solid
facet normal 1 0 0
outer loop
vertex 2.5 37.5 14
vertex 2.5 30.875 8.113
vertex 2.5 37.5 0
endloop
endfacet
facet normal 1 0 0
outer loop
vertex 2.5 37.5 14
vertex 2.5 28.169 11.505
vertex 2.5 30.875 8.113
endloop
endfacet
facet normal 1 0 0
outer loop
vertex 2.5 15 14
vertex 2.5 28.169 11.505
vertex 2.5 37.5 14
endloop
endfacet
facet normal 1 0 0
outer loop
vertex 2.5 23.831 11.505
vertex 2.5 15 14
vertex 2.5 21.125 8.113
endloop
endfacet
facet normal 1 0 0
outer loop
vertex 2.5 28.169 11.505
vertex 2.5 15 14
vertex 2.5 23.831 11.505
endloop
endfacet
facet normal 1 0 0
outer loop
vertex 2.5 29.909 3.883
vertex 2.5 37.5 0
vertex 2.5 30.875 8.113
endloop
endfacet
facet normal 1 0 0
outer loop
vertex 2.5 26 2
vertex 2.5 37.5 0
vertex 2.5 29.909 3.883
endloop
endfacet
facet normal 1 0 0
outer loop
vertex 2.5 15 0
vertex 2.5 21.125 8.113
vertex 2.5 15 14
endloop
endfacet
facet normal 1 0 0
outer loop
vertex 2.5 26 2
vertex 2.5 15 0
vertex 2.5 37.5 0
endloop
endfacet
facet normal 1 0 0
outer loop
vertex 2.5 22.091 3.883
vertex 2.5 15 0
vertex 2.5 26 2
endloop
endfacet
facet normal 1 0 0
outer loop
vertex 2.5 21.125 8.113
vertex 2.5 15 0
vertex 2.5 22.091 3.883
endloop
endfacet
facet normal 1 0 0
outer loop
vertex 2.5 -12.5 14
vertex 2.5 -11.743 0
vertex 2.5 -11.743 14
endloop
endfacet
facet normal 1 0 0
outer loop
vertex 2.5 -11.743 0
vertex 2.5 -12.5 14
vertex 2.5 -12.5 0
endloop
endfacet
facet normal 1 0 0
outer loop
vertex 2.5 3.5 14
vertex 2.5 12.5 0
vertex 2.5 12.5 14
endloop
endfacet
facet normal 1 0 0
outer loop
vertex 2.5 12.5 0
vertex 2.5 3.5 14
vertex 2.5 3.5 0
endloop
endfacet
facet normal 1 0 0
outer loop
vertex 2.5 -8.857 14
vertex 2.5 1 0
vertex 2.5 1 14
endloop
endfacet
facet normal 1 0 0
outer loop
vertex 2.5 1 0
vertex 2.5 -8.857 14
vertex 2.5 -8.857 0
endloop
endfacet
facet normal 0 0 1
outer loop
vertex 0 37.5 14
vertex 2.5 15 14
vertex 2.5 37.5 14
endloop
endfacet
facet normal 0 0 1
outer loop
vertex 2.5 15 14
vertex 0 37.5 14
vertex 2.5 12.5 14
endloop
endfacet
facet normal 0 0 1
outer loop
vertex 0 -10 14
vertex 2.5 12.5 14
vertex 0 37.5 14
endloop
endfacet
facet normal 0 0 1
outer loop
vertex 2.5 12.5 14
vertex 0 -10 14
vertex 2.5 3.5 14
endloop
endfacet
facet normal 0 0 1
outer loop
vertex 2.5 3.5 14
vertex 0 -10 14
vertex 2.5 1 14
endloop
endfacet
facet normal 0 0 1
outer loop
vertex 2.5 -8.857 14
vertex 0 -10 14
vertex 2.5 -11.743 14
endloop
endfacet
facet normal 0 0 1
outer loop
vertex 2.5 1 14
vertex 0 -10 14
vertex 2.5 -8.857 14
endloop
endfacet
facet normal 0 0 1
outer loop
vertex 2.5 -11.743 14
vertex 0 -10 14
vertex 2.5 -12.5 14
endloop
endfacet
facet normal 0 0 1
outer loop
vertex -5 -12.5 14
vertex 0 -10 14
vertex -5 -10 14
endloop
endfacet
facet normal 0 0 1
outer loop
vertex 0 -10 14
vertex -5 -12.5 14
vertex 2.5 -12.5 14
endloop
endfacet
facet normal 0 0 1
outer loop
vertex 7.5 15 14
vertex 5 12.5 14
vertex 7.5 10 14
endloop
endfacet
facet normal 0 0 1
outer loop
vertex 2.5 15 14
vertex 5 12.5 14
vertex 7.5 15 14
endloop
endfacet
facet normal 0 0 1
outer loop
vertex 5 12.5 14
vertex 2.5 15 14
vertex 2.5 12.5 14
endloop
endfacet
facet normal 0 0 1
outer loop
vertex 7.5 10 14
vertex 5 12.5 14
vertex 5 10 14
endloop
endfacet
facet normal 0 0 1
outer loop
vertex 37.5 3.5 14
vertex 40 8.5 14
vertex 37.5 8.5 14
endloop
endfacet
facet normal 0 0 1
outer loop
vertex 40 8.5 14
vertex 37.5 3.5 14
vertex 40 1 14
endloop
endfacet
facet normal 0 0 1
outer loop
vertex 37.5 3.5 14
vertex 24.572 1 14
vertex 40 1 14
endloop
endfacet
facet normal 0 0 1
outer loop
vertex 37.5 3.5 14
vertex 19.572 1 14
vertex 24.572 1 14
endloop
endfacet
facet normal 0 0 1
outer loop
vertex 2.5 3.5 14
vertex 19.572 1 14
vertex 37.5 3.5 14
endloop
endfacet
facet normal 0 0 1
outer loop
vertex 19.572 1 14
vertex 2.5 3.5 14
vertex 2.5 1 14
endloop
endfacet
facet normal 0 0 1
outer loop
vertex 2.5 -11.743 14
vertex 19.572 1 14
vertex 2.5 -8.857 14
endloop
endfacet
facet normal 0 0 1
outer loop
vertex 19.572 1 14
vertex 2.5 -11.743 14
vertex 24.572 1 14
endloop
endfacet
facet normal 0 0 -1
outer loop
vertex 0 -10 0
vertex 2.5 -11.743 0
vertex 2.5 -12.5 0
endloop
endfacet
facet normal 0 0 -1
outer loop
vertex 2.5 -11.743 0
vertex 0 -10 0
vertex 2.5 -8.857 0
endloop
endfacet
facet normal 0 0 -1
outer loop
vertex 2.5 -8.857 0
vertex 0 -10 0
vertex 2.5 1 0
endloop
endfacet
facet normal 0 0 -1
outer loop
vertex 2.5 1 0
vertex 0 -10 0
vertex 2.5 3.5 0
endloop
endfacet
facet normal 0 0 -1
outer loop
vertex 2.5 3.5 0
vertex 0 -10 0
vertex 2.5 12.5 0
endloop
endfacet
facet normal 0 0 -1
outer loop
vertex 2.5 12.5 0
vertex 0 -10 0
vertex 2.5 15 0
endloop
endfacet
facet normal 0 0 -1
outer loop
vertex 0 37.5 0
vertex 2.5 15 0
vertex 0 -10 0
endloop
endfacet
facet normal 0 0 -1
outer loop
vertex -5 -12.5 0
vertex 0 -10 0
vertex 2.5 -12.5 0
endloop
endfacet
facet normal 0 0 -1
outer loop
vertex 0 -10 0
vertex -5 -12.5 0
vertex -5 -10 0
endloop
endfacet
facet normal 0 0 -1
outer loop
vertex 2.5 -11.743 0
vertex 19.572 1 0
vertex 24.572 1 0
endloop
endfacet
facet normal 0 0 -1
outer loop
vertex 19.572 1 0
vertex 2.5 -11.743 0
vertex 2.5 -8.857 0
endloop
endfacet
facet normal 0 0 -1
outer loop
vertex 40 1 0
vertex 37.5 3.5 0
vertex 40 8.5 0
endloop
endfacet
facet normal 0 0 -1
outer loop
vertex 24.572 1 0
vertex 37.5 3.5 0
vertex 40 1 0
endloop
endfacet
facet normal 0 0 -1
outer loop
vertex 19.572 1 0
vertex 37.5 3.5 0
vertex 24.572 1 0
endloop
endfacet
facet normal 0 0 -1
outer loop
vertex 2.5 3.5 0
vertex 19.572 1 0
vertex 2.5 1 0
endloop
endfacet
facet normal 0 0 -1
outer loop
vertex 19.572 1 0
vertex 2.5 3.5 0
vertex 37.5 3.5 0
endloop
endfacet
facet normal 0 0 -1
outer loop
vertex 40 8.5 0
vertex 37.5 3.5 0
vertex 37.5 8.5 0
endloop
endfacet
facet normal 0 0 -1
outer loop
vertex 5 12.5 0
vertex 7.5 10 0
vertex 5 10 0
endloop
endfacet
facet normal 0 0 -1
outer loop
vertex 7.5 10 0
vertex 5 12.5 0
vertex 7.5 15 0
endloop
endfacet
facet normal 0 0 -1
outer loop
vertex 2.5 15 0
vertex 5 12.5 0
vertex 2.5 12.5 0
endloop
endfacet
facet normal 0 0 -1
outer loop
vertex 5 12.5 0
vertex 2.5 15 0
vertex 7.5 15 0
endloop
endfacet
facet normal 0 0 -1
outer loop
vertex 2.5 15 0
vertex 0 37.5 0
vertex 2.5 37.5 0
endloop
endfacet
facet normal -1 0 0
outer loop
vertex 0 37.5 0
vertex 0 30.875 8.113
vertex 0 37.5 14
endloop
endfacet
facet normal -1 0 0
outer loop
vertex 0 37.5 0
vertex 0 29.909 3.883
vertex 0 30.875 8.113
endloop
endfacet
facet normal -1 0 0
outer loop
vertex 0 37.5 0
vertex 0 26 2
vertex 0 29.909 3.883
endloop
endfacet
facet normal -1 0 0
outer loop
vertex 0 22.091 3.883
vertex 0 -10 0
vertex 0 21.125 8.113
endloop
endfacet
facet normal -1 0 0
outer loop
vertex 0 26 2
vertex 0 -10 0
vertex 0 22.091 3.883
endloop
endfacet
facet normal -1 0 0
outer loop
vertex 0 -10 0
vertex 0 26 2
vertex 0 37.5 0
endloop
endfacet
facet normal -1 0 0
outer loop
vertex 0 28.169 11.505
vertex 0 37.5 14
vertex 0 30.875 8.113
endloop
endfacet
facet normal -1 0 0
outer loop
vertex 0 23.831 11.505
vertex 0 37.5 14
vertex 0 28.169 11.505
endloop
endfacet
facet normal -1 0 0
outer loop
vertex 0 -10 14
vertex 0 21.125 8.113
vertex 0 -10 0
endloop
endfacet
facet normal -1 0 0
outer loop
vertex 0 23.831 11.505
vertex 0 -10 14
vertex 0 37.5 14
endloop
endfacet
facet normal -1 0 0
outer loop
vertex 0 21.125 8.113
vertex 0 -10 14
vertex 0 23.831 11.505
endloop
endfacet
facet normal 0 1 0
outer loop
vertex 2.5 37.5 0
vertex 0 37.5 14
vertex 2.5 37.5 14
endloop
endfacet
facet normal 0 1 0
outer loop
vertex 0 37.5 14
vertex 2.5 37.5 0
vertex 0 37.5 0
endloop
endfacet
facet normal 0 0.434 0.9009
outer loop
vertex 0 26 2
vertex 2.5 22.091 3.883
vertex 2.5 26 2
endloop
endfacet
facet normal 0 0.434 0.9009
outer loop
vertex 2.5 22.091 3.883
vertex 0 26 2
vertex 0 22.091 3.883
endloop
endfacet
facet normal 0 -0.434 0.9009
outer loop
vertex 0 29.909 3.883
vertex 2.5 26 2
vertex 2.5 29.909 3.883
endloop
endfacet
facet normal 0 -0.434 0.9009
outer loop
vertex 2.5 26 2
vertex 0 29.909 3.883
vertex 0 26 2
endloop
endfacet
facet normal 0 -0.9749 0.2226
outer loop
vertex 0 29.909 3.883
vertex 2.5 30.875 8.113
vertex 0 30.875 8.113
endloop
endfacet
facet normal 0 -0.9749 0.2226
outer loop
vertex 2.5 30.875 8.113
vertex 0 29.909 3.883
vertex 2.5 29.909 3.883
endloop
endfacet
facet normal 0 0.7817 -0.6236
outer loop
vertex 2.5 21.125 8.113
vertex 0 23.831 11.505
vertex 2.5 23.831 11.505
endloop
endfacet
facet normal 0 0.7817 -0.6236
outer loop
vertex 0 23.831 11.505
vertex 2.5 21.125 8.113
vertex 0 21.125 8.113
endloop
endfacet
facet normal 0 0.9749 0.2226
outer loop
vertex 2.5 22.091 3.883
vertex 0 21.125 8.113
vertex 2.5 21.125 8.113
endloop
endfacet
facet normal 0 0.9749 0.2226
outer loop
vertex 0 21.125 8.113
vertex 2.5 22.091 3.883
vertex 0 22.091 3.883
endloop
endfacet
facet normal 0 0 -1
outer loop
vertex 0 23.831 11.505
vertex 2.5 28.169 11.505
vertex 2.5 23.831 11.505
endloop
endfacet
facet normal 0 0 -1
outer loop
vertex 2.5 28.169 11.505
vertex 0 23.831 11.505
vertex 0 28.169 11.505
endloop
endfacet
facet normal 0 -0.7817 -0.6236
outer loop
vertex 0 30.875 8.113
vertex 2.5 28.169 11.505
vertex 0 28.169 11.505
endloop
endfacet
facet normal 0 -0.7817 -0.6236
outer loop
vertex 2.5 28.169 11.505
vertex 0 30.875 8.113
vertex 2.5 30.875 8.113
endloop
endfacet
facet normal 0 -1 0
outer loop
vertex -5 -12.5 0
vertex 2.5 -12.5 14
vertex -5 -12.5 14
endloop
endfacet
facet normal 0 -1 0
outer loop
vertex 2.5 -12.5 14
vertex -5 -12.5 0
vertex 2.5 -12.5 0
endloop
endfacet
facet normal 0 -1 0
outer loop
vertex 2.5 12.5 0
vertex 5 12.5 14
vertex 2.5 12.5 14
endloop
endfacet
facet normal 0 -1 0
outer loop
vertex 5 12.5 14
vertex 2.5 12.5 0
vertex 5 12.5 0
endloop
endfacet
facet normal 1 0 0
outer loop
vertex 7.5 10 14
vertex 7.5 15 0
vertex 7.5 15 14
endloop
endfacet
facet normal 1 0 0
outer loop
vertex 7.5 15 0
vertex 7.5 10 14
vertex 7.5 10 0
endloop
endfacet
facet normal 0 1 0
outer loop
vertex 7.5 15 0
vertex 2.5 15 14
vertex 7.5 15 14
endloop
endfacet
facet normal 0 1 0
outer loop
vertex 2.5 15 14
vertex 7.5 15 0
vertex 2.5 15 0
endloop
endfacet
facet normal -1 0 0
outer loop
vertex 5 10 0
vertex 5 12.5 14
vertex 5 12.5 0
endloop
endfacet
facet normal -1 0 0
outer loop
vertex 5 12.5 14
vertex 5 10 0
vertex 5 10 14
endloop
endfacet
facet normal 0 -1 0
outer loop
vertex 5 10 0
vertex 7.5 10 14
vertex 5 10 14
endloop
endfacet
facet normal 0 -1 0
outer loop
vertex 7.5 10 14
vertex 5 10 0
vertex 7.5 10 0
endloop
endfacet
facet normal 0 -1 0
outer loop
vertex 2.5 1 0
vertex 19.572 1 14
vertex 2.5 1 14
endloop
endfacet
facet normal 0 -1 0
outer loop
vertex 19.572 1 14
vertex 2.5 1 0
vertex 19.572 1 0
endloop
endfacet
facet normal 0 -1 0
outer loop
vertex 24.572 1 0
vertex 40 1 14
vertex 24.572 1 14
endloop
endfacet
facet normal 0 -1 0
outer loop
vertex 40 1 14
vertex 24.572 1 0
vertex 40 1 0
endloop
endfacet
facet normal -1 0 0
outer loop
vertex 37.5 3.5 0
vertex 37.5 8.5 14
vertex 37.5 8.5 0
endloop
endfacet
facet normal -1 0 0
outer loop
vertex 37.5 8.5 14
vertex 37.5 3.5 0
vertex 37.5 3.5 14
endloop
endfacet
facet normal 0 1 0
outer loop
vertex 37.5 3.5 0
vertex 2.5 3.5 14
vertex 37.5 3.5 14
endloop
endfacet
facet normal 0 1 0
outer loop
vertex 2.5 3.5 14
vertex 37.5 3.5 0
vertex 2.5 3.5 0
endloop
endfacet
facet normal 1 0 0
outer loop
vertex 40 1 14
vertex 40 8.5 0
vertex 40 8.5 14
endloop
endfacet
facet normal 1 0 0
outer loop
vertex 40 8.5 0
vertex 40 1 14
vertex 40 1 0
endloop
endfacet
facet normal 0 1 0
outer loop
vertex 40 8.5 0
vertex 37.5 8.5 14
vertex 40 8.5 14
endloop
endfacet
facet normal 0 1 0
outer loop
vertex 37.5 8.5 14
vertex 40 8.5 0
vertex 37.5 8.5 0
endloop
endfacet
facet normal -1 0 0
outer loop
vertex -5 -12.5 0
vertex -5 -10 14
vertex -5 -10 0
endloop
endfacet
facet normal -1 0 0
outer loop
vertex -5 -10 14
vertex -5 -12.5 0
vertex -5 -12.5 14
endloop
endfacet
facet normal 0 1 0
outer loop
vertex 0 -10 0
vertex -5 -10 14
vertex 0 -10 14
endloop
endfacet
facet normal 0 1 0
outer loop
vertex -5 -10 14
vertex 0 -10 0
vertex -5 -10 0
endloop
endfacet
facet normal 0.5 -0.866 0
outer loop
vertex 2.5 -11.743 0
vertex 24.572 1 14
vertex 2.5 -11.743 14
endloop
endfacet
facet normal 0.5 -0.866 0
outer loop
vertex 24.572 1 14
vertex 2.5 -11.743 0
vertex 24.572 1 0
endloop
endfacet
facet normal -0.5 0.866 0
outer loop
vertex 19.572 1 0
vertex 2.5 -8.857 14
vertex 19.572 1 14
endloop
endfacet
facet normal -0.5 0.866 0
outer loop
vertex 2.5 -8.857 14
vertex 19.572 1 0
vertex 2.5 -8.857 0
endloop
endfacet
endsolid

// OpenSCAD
// Title: Eggcrate suction cup glass mount
// Description: Designed to work with MaxiJet suction cups
// Author: Shane Graber
// URL: http://thingiverse.com/sgraber

wt = 2.5; 	// wall thickness, mm
ww = 14;  	// wall width, mm
y  = 25;  	// length of fixture, mm
hole = 10;	// suction cup hole diameter, mm


translate([0,-y/2,0]) {
union() {

	// eggcrate attachment
	cube(size=[wt, y, ww]);
	rotate([0,0,90]) translate([y,-(wt+2.5+wt),0]) cube(size=[wt, wt+2.5+wt, ww]);
	translate([wt+2.5,y-2.5,0]) cube(size=[wt,wt*2,ww]);
	translate([35+wt,y-wt-9,0]) rotate([0,0,90]) cube(size=[wt,35+wt,ww]);
	translate([35+wt,y-wt-9,0]) cube(size=[wt, wt*3, ww]);
	translate([0,0,0]) rotate([0,0,90]) cube(size=[wt,5,ww]);
	translate([0,2.2,0]) rotate([0,0,-60]) cube(size=[wt,27,ww]);

	// suction cup attachment
	difference() {
		translate([0,y,0]) cube(size=[wt, 25, ww]);
		translate([-4,y+25/2+1,ww/2]) rotate([0,90,0]) cylinder(r=hole/2, h=10, $fn=7);
	}
	
}
}
